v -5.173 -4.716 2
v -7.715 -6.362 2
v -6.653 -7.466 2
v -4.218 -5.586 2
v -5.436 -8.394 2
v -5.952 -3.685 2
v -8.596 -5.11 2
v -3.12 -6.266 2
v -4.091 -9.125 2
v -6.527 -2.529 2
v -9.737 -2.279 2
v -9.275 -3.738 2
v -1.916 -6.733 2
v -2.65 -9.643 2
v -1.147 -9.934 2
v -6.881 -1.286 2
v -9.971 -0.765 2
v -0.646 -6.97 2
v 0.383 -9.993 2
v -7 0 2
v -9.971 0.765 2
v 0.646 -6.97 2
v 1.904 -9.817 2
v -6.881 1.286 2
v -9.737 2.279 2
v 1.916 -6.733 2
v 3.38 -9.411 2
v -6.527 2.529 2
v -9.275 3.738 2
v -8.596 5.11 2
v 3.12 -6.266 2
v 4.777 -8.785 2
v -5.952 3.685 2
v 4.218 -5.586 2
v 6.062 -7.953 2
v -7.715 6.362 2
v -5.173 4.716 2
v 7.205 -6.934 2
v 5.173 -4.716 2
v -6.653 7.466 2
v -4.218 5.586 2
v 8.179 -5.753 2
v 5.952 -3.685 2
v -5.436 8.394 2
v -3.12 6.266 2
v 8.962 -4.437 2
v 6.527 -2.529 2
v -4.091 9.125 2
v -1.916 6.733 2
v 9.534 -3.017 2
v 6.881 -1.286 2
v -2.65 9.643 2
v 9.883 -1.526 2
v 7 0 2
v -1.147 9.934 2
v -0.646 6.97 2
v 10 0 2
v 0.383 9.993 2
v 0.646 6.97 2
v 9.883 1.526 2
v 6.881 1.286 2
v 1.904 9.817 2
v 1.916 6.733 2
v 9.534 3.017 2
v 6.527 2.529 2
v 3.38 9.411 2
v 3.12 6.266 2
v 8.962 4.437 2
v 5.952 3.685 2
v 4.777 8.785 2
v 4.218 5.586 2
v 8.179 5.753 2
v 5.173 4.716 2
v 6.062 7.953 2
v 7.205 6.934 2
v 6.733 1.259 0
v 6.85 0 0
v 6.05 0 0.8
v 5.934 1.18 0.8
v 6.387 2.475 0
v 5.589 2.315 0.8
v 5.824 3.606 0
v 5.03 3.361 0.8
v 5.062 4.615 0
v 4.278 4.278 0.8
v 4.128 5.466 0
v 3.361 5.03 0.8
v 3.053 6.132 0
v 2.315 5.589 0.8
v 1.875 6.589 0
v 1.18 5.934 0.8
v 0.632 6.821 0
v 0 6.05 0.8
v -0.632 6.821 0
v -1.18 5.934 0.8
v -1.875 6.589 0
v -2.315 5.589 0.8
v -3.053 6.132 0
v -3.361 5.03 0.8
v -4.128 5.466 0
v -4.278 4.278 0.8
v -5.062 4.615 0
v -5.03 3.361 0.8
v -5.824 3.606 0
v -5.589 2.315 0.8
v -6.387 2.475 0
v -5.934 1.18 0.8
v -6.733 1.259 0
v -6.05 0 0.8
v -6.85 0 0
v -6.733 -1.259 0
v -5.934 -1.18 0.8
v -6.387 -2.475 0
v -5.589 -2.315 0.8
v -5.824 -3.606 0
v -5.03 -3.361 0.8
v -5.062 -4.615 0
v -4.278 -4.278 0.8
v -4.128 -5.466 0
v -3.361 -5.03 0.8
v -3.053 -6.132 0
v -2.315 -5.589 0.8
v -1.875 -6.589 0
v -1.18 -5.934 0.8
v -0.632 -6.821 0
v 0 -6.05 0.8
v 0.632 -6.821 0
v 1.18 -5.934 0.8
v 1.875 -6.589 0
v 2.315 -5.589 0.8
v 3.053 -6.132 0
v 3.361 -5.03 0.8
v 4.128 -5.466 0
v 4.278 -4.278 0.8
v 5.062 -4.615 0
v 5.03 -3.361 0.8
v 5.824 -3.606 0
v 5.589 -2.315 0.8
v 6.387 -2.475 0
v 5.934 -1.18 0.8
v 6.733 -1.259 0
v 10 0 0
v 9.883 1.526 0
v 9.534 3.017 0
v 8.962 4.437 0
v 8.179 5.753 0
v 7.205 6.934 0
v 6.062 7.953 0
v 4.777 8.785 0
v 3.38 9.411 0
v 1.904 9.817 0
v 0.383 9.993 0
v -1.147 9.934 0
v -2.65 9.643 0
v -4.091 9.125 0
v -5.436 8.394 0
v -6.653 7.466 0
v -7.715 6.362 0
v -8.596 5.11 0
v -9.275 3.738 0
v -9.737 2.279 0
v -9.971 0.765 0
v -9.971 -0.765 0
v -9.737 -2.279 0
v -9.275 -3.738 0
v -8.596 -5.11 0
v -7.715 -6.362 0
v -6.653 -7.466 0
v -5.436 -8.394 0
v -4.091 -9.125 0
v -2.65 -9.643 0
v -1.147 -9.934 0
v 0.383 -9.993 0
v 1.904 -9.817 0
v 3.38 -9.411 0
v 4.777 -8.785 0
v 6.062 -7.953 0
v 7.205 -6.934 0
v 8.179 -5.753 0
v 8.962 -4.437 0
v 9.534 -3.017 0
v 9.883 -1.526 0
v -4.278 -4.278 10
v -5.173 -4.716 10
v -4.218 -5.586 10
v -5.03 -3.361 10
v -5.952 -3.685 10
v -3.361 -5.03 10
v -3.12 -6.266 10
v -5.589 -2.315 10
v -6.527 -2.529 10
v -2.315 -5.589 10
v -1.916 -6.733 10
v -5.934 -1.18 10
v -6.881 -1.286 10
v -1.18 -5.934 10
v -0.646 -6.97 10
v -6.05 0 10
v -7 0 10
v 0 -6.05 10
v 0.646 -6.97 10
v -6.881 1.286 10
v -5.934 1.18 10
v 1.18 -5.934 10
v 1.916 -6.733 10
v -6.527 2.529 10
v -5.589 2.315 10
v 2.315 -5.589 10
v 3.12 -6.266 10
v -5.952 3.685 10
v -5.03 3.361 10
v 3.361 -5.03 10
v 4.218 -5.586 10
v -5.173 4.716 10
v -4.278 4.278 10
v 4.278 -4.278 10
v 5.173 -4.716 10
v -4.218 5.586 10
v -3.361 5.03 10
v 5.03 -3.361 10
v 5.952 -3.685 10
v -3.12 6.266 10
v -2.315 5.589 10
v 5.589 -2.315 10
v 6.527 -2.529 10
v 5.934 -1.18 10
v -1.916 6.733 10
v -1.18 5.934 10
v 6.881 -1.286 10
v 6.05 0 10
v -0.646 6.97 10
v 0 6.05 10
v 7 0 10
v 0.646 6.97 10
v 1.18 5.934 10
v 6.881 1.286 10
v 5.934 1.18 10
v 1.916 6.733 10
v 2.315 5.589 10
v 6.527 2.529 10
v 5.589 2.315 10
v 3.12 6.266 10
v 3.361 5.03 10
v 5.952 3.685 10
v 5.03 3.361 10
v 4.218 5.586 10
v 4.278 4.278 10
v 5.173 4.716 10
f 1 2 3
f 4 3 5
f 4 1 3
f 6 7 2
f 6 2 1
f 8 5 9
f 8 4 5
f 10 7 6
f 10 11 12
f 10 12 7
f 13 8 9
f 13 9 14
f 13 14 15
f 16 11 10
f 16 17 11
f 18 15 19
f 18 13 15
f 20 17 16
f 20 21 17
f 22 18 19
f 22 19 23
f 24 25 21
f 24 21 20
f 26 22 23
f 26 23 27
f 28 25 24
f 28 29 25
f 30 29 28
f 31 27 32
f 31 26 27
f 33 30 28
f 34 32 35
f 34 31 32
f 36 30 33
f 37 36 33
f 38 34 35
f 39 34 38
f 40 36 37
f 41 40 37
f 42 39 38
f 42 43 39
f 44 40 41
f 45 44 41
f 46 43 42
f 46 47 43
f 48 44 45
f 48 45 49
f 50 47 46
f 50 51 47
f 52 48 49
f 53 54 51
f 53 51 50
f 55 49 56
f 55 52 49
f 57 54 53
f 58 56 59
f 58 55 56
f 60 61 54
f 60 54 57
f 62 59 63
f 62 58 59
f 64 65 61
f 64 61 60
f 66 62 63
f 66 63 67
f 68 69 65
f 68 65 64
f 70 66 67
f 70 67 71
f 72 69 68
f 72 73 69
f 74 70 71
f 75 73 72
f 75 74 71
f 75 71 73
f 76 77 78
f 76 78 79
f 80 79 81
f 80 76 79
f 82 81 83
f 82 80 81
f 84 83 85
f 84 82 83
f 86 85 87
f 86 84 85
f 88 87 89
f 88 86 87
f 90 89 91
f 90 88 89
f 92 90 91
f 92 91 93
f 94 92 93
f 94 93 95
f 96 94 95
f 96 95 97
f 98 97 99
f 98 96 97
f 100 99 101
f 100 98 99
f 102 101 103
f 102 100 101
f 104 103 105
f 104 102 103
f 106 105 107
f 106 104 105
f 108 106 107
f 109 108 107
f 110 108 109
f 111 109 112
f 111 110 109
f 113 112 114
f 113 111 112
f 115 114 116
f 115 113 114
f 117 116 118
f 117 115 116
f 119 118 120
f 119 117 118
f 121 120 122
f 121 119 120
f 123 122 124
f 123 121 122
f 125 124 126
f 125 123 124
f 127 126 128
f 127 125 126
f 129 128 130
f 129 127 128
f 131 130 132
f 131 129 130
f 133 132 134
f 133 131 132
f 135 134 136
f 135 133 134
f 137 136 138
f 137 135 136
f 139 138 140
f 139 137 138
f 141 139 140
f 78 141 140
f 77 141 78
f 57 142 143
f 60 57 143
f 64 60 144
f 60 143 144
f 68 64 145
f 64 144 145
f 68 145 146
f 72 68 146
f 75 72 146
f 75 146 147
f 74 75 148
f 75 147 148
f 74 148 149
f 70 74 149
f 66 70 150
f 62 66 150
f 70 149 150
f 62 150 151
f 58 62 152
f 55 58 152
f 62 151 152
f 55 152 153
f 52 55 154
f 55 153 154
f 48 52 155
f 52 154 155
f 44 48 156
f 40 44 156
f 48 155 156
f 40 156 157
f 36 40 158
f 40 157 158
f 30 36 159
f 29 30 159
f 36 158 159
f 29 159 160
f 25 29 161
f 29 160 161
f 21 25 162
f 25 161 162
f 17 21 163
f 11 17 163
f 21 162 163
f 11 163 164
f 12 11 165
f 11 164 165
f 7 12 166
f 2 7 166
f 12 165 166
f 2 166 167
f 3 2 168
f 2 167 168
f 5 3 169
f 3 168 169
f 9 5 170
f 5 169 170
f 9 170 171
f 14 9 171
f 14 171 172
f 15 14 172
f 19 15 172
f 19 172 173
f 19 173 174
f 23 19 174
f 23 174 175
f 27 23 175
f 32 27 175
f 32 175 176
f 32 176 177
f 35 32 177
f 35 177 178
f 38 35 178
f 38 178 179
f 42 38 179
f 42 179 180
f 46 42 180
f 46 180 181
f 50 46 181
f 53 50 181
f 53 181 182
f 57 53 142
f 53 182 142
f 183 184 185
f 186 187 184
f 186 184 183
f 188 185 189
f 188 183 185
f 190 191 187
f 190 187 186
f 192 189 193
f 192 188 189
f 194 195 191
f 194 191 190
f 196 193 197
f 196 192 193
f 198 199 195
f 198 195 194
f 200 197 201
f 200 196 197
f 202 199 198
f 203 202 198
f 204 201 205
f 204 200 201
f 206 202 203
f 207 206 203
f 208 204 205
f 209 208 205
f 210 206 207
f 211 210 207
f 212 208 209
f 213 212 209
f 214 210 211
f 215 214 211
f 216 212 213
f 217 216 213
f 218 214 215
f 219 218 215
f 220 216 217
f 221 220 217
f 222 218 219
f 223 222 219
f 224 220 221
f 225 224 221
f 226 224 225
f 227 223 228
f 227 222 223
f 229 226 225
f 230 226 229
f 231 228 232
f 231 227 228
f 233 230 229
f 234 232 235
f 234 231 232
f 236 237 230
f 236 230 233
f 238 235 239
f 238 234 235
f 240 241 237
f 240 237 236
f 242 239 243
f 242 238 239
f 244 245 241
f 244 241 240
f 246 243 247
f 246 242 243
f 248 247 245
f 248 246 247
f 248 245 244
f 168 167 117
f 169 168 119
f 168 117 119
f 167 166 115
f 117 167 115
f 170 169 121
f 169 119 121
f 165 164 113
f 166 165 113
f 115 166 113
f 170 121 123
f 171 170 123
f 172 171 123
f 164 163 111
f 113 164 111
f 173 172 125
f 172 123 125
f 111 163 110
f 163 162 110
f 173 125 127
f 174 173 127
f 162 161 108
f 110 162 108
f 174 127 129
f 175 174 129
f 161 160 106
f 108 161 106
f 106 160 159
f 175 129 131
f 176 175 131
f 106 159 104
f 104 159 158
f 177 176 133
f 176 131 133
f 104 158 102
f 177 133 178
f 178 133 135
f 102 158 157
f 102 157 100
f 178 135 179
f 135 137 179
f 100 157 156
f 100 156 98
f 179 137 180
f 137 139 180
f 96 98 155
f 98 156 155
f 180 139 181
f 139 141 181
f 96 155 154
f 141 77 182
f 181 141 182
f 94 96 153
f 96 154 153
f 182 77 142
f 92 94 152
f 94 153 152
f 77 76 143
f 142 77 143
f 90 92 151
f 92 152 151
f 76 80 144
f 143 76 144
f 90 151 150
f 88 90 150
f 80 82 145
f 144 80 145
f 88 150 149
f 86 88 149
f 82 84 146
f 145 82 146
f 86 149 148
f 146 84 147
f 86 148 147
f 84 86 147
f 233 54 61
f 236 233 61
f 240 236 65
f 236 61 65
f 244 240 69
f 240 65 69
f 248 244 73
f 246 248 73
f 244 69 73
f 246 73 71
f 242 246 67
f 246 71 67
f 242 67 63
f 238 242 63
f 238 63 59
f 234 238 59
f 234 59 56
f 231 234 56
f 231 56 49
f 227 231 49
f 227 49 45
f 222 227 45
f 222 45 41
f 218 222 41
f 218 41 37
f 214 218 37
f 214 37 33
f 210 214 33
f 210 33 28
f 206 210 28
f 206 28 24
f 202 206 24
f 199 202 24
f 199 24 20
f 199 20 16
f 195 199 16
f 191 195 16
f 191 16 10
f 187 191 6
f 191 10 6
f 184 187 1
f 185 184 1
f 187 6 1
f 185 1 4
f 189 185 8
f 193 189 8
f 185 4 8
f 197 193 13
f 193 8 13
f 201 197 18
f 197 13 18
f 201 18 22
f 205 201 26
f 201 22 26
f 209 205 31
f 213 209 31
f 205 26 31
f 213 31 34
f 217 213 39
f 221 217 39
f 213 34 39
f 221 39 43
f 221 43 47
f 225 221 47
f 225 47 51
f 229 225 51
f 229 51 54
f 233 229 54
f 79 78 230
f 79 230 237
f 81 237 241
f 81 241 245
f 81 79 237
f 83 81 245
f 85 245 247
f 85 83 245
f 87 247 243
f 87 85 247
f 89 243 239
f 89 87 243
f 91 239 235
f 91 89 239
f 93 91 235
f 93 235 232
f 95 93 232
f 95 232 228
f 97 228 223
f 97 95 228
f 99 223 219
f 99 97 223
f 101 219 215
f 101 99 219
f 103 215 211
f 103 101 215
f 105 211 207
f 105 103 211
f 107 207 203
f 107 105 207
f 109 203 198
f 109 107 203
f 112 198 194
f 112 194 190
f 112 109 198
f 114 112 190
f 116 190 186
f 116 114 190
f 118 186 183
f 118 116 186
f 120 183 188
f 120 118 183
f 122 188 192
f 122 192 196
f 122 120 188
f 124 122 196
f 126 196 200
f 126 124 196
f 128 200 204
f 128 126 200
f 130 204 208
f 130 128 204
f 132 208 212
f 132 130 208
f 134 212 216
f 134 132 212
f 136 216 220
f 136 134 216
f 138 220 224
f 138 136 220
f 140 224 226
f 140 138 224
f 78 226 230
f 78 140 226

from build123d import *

# Parameters (mm, degrees)
F1_R     = 10
F1_R_2   = 7
F2_DEPTH = 2
F1_R_3   = 6.05
F3_DEPTH = 10
F4_SIZE  = 0.8


with BuildPart() as f2:
    # F1 (on Top) → F2 (new body)
    with BuildSketch(Plane.XY):
        Circle(F1_R)
        Circle(F1_R_2, mode=Mode.SUBTRACT)
    extrude(amount=F2_DEPTH)

    # F1 (on Top) → F3 (join)
    with BuildSketch(Plane.XY):
        Circle(F1_R_2)
        Circle(F1_R_3, mode=Mode.SUBTRACT)
    extrude(amount=F3_DEPTH)

    # F4
    f4_edges = [f2.edges().sort_by_distance(p)[0] for p in [
        (-6.05, 0, 0),
    ]]
    chamfer(f4_edges, length=F4_SIZE)


solid = f2.part
